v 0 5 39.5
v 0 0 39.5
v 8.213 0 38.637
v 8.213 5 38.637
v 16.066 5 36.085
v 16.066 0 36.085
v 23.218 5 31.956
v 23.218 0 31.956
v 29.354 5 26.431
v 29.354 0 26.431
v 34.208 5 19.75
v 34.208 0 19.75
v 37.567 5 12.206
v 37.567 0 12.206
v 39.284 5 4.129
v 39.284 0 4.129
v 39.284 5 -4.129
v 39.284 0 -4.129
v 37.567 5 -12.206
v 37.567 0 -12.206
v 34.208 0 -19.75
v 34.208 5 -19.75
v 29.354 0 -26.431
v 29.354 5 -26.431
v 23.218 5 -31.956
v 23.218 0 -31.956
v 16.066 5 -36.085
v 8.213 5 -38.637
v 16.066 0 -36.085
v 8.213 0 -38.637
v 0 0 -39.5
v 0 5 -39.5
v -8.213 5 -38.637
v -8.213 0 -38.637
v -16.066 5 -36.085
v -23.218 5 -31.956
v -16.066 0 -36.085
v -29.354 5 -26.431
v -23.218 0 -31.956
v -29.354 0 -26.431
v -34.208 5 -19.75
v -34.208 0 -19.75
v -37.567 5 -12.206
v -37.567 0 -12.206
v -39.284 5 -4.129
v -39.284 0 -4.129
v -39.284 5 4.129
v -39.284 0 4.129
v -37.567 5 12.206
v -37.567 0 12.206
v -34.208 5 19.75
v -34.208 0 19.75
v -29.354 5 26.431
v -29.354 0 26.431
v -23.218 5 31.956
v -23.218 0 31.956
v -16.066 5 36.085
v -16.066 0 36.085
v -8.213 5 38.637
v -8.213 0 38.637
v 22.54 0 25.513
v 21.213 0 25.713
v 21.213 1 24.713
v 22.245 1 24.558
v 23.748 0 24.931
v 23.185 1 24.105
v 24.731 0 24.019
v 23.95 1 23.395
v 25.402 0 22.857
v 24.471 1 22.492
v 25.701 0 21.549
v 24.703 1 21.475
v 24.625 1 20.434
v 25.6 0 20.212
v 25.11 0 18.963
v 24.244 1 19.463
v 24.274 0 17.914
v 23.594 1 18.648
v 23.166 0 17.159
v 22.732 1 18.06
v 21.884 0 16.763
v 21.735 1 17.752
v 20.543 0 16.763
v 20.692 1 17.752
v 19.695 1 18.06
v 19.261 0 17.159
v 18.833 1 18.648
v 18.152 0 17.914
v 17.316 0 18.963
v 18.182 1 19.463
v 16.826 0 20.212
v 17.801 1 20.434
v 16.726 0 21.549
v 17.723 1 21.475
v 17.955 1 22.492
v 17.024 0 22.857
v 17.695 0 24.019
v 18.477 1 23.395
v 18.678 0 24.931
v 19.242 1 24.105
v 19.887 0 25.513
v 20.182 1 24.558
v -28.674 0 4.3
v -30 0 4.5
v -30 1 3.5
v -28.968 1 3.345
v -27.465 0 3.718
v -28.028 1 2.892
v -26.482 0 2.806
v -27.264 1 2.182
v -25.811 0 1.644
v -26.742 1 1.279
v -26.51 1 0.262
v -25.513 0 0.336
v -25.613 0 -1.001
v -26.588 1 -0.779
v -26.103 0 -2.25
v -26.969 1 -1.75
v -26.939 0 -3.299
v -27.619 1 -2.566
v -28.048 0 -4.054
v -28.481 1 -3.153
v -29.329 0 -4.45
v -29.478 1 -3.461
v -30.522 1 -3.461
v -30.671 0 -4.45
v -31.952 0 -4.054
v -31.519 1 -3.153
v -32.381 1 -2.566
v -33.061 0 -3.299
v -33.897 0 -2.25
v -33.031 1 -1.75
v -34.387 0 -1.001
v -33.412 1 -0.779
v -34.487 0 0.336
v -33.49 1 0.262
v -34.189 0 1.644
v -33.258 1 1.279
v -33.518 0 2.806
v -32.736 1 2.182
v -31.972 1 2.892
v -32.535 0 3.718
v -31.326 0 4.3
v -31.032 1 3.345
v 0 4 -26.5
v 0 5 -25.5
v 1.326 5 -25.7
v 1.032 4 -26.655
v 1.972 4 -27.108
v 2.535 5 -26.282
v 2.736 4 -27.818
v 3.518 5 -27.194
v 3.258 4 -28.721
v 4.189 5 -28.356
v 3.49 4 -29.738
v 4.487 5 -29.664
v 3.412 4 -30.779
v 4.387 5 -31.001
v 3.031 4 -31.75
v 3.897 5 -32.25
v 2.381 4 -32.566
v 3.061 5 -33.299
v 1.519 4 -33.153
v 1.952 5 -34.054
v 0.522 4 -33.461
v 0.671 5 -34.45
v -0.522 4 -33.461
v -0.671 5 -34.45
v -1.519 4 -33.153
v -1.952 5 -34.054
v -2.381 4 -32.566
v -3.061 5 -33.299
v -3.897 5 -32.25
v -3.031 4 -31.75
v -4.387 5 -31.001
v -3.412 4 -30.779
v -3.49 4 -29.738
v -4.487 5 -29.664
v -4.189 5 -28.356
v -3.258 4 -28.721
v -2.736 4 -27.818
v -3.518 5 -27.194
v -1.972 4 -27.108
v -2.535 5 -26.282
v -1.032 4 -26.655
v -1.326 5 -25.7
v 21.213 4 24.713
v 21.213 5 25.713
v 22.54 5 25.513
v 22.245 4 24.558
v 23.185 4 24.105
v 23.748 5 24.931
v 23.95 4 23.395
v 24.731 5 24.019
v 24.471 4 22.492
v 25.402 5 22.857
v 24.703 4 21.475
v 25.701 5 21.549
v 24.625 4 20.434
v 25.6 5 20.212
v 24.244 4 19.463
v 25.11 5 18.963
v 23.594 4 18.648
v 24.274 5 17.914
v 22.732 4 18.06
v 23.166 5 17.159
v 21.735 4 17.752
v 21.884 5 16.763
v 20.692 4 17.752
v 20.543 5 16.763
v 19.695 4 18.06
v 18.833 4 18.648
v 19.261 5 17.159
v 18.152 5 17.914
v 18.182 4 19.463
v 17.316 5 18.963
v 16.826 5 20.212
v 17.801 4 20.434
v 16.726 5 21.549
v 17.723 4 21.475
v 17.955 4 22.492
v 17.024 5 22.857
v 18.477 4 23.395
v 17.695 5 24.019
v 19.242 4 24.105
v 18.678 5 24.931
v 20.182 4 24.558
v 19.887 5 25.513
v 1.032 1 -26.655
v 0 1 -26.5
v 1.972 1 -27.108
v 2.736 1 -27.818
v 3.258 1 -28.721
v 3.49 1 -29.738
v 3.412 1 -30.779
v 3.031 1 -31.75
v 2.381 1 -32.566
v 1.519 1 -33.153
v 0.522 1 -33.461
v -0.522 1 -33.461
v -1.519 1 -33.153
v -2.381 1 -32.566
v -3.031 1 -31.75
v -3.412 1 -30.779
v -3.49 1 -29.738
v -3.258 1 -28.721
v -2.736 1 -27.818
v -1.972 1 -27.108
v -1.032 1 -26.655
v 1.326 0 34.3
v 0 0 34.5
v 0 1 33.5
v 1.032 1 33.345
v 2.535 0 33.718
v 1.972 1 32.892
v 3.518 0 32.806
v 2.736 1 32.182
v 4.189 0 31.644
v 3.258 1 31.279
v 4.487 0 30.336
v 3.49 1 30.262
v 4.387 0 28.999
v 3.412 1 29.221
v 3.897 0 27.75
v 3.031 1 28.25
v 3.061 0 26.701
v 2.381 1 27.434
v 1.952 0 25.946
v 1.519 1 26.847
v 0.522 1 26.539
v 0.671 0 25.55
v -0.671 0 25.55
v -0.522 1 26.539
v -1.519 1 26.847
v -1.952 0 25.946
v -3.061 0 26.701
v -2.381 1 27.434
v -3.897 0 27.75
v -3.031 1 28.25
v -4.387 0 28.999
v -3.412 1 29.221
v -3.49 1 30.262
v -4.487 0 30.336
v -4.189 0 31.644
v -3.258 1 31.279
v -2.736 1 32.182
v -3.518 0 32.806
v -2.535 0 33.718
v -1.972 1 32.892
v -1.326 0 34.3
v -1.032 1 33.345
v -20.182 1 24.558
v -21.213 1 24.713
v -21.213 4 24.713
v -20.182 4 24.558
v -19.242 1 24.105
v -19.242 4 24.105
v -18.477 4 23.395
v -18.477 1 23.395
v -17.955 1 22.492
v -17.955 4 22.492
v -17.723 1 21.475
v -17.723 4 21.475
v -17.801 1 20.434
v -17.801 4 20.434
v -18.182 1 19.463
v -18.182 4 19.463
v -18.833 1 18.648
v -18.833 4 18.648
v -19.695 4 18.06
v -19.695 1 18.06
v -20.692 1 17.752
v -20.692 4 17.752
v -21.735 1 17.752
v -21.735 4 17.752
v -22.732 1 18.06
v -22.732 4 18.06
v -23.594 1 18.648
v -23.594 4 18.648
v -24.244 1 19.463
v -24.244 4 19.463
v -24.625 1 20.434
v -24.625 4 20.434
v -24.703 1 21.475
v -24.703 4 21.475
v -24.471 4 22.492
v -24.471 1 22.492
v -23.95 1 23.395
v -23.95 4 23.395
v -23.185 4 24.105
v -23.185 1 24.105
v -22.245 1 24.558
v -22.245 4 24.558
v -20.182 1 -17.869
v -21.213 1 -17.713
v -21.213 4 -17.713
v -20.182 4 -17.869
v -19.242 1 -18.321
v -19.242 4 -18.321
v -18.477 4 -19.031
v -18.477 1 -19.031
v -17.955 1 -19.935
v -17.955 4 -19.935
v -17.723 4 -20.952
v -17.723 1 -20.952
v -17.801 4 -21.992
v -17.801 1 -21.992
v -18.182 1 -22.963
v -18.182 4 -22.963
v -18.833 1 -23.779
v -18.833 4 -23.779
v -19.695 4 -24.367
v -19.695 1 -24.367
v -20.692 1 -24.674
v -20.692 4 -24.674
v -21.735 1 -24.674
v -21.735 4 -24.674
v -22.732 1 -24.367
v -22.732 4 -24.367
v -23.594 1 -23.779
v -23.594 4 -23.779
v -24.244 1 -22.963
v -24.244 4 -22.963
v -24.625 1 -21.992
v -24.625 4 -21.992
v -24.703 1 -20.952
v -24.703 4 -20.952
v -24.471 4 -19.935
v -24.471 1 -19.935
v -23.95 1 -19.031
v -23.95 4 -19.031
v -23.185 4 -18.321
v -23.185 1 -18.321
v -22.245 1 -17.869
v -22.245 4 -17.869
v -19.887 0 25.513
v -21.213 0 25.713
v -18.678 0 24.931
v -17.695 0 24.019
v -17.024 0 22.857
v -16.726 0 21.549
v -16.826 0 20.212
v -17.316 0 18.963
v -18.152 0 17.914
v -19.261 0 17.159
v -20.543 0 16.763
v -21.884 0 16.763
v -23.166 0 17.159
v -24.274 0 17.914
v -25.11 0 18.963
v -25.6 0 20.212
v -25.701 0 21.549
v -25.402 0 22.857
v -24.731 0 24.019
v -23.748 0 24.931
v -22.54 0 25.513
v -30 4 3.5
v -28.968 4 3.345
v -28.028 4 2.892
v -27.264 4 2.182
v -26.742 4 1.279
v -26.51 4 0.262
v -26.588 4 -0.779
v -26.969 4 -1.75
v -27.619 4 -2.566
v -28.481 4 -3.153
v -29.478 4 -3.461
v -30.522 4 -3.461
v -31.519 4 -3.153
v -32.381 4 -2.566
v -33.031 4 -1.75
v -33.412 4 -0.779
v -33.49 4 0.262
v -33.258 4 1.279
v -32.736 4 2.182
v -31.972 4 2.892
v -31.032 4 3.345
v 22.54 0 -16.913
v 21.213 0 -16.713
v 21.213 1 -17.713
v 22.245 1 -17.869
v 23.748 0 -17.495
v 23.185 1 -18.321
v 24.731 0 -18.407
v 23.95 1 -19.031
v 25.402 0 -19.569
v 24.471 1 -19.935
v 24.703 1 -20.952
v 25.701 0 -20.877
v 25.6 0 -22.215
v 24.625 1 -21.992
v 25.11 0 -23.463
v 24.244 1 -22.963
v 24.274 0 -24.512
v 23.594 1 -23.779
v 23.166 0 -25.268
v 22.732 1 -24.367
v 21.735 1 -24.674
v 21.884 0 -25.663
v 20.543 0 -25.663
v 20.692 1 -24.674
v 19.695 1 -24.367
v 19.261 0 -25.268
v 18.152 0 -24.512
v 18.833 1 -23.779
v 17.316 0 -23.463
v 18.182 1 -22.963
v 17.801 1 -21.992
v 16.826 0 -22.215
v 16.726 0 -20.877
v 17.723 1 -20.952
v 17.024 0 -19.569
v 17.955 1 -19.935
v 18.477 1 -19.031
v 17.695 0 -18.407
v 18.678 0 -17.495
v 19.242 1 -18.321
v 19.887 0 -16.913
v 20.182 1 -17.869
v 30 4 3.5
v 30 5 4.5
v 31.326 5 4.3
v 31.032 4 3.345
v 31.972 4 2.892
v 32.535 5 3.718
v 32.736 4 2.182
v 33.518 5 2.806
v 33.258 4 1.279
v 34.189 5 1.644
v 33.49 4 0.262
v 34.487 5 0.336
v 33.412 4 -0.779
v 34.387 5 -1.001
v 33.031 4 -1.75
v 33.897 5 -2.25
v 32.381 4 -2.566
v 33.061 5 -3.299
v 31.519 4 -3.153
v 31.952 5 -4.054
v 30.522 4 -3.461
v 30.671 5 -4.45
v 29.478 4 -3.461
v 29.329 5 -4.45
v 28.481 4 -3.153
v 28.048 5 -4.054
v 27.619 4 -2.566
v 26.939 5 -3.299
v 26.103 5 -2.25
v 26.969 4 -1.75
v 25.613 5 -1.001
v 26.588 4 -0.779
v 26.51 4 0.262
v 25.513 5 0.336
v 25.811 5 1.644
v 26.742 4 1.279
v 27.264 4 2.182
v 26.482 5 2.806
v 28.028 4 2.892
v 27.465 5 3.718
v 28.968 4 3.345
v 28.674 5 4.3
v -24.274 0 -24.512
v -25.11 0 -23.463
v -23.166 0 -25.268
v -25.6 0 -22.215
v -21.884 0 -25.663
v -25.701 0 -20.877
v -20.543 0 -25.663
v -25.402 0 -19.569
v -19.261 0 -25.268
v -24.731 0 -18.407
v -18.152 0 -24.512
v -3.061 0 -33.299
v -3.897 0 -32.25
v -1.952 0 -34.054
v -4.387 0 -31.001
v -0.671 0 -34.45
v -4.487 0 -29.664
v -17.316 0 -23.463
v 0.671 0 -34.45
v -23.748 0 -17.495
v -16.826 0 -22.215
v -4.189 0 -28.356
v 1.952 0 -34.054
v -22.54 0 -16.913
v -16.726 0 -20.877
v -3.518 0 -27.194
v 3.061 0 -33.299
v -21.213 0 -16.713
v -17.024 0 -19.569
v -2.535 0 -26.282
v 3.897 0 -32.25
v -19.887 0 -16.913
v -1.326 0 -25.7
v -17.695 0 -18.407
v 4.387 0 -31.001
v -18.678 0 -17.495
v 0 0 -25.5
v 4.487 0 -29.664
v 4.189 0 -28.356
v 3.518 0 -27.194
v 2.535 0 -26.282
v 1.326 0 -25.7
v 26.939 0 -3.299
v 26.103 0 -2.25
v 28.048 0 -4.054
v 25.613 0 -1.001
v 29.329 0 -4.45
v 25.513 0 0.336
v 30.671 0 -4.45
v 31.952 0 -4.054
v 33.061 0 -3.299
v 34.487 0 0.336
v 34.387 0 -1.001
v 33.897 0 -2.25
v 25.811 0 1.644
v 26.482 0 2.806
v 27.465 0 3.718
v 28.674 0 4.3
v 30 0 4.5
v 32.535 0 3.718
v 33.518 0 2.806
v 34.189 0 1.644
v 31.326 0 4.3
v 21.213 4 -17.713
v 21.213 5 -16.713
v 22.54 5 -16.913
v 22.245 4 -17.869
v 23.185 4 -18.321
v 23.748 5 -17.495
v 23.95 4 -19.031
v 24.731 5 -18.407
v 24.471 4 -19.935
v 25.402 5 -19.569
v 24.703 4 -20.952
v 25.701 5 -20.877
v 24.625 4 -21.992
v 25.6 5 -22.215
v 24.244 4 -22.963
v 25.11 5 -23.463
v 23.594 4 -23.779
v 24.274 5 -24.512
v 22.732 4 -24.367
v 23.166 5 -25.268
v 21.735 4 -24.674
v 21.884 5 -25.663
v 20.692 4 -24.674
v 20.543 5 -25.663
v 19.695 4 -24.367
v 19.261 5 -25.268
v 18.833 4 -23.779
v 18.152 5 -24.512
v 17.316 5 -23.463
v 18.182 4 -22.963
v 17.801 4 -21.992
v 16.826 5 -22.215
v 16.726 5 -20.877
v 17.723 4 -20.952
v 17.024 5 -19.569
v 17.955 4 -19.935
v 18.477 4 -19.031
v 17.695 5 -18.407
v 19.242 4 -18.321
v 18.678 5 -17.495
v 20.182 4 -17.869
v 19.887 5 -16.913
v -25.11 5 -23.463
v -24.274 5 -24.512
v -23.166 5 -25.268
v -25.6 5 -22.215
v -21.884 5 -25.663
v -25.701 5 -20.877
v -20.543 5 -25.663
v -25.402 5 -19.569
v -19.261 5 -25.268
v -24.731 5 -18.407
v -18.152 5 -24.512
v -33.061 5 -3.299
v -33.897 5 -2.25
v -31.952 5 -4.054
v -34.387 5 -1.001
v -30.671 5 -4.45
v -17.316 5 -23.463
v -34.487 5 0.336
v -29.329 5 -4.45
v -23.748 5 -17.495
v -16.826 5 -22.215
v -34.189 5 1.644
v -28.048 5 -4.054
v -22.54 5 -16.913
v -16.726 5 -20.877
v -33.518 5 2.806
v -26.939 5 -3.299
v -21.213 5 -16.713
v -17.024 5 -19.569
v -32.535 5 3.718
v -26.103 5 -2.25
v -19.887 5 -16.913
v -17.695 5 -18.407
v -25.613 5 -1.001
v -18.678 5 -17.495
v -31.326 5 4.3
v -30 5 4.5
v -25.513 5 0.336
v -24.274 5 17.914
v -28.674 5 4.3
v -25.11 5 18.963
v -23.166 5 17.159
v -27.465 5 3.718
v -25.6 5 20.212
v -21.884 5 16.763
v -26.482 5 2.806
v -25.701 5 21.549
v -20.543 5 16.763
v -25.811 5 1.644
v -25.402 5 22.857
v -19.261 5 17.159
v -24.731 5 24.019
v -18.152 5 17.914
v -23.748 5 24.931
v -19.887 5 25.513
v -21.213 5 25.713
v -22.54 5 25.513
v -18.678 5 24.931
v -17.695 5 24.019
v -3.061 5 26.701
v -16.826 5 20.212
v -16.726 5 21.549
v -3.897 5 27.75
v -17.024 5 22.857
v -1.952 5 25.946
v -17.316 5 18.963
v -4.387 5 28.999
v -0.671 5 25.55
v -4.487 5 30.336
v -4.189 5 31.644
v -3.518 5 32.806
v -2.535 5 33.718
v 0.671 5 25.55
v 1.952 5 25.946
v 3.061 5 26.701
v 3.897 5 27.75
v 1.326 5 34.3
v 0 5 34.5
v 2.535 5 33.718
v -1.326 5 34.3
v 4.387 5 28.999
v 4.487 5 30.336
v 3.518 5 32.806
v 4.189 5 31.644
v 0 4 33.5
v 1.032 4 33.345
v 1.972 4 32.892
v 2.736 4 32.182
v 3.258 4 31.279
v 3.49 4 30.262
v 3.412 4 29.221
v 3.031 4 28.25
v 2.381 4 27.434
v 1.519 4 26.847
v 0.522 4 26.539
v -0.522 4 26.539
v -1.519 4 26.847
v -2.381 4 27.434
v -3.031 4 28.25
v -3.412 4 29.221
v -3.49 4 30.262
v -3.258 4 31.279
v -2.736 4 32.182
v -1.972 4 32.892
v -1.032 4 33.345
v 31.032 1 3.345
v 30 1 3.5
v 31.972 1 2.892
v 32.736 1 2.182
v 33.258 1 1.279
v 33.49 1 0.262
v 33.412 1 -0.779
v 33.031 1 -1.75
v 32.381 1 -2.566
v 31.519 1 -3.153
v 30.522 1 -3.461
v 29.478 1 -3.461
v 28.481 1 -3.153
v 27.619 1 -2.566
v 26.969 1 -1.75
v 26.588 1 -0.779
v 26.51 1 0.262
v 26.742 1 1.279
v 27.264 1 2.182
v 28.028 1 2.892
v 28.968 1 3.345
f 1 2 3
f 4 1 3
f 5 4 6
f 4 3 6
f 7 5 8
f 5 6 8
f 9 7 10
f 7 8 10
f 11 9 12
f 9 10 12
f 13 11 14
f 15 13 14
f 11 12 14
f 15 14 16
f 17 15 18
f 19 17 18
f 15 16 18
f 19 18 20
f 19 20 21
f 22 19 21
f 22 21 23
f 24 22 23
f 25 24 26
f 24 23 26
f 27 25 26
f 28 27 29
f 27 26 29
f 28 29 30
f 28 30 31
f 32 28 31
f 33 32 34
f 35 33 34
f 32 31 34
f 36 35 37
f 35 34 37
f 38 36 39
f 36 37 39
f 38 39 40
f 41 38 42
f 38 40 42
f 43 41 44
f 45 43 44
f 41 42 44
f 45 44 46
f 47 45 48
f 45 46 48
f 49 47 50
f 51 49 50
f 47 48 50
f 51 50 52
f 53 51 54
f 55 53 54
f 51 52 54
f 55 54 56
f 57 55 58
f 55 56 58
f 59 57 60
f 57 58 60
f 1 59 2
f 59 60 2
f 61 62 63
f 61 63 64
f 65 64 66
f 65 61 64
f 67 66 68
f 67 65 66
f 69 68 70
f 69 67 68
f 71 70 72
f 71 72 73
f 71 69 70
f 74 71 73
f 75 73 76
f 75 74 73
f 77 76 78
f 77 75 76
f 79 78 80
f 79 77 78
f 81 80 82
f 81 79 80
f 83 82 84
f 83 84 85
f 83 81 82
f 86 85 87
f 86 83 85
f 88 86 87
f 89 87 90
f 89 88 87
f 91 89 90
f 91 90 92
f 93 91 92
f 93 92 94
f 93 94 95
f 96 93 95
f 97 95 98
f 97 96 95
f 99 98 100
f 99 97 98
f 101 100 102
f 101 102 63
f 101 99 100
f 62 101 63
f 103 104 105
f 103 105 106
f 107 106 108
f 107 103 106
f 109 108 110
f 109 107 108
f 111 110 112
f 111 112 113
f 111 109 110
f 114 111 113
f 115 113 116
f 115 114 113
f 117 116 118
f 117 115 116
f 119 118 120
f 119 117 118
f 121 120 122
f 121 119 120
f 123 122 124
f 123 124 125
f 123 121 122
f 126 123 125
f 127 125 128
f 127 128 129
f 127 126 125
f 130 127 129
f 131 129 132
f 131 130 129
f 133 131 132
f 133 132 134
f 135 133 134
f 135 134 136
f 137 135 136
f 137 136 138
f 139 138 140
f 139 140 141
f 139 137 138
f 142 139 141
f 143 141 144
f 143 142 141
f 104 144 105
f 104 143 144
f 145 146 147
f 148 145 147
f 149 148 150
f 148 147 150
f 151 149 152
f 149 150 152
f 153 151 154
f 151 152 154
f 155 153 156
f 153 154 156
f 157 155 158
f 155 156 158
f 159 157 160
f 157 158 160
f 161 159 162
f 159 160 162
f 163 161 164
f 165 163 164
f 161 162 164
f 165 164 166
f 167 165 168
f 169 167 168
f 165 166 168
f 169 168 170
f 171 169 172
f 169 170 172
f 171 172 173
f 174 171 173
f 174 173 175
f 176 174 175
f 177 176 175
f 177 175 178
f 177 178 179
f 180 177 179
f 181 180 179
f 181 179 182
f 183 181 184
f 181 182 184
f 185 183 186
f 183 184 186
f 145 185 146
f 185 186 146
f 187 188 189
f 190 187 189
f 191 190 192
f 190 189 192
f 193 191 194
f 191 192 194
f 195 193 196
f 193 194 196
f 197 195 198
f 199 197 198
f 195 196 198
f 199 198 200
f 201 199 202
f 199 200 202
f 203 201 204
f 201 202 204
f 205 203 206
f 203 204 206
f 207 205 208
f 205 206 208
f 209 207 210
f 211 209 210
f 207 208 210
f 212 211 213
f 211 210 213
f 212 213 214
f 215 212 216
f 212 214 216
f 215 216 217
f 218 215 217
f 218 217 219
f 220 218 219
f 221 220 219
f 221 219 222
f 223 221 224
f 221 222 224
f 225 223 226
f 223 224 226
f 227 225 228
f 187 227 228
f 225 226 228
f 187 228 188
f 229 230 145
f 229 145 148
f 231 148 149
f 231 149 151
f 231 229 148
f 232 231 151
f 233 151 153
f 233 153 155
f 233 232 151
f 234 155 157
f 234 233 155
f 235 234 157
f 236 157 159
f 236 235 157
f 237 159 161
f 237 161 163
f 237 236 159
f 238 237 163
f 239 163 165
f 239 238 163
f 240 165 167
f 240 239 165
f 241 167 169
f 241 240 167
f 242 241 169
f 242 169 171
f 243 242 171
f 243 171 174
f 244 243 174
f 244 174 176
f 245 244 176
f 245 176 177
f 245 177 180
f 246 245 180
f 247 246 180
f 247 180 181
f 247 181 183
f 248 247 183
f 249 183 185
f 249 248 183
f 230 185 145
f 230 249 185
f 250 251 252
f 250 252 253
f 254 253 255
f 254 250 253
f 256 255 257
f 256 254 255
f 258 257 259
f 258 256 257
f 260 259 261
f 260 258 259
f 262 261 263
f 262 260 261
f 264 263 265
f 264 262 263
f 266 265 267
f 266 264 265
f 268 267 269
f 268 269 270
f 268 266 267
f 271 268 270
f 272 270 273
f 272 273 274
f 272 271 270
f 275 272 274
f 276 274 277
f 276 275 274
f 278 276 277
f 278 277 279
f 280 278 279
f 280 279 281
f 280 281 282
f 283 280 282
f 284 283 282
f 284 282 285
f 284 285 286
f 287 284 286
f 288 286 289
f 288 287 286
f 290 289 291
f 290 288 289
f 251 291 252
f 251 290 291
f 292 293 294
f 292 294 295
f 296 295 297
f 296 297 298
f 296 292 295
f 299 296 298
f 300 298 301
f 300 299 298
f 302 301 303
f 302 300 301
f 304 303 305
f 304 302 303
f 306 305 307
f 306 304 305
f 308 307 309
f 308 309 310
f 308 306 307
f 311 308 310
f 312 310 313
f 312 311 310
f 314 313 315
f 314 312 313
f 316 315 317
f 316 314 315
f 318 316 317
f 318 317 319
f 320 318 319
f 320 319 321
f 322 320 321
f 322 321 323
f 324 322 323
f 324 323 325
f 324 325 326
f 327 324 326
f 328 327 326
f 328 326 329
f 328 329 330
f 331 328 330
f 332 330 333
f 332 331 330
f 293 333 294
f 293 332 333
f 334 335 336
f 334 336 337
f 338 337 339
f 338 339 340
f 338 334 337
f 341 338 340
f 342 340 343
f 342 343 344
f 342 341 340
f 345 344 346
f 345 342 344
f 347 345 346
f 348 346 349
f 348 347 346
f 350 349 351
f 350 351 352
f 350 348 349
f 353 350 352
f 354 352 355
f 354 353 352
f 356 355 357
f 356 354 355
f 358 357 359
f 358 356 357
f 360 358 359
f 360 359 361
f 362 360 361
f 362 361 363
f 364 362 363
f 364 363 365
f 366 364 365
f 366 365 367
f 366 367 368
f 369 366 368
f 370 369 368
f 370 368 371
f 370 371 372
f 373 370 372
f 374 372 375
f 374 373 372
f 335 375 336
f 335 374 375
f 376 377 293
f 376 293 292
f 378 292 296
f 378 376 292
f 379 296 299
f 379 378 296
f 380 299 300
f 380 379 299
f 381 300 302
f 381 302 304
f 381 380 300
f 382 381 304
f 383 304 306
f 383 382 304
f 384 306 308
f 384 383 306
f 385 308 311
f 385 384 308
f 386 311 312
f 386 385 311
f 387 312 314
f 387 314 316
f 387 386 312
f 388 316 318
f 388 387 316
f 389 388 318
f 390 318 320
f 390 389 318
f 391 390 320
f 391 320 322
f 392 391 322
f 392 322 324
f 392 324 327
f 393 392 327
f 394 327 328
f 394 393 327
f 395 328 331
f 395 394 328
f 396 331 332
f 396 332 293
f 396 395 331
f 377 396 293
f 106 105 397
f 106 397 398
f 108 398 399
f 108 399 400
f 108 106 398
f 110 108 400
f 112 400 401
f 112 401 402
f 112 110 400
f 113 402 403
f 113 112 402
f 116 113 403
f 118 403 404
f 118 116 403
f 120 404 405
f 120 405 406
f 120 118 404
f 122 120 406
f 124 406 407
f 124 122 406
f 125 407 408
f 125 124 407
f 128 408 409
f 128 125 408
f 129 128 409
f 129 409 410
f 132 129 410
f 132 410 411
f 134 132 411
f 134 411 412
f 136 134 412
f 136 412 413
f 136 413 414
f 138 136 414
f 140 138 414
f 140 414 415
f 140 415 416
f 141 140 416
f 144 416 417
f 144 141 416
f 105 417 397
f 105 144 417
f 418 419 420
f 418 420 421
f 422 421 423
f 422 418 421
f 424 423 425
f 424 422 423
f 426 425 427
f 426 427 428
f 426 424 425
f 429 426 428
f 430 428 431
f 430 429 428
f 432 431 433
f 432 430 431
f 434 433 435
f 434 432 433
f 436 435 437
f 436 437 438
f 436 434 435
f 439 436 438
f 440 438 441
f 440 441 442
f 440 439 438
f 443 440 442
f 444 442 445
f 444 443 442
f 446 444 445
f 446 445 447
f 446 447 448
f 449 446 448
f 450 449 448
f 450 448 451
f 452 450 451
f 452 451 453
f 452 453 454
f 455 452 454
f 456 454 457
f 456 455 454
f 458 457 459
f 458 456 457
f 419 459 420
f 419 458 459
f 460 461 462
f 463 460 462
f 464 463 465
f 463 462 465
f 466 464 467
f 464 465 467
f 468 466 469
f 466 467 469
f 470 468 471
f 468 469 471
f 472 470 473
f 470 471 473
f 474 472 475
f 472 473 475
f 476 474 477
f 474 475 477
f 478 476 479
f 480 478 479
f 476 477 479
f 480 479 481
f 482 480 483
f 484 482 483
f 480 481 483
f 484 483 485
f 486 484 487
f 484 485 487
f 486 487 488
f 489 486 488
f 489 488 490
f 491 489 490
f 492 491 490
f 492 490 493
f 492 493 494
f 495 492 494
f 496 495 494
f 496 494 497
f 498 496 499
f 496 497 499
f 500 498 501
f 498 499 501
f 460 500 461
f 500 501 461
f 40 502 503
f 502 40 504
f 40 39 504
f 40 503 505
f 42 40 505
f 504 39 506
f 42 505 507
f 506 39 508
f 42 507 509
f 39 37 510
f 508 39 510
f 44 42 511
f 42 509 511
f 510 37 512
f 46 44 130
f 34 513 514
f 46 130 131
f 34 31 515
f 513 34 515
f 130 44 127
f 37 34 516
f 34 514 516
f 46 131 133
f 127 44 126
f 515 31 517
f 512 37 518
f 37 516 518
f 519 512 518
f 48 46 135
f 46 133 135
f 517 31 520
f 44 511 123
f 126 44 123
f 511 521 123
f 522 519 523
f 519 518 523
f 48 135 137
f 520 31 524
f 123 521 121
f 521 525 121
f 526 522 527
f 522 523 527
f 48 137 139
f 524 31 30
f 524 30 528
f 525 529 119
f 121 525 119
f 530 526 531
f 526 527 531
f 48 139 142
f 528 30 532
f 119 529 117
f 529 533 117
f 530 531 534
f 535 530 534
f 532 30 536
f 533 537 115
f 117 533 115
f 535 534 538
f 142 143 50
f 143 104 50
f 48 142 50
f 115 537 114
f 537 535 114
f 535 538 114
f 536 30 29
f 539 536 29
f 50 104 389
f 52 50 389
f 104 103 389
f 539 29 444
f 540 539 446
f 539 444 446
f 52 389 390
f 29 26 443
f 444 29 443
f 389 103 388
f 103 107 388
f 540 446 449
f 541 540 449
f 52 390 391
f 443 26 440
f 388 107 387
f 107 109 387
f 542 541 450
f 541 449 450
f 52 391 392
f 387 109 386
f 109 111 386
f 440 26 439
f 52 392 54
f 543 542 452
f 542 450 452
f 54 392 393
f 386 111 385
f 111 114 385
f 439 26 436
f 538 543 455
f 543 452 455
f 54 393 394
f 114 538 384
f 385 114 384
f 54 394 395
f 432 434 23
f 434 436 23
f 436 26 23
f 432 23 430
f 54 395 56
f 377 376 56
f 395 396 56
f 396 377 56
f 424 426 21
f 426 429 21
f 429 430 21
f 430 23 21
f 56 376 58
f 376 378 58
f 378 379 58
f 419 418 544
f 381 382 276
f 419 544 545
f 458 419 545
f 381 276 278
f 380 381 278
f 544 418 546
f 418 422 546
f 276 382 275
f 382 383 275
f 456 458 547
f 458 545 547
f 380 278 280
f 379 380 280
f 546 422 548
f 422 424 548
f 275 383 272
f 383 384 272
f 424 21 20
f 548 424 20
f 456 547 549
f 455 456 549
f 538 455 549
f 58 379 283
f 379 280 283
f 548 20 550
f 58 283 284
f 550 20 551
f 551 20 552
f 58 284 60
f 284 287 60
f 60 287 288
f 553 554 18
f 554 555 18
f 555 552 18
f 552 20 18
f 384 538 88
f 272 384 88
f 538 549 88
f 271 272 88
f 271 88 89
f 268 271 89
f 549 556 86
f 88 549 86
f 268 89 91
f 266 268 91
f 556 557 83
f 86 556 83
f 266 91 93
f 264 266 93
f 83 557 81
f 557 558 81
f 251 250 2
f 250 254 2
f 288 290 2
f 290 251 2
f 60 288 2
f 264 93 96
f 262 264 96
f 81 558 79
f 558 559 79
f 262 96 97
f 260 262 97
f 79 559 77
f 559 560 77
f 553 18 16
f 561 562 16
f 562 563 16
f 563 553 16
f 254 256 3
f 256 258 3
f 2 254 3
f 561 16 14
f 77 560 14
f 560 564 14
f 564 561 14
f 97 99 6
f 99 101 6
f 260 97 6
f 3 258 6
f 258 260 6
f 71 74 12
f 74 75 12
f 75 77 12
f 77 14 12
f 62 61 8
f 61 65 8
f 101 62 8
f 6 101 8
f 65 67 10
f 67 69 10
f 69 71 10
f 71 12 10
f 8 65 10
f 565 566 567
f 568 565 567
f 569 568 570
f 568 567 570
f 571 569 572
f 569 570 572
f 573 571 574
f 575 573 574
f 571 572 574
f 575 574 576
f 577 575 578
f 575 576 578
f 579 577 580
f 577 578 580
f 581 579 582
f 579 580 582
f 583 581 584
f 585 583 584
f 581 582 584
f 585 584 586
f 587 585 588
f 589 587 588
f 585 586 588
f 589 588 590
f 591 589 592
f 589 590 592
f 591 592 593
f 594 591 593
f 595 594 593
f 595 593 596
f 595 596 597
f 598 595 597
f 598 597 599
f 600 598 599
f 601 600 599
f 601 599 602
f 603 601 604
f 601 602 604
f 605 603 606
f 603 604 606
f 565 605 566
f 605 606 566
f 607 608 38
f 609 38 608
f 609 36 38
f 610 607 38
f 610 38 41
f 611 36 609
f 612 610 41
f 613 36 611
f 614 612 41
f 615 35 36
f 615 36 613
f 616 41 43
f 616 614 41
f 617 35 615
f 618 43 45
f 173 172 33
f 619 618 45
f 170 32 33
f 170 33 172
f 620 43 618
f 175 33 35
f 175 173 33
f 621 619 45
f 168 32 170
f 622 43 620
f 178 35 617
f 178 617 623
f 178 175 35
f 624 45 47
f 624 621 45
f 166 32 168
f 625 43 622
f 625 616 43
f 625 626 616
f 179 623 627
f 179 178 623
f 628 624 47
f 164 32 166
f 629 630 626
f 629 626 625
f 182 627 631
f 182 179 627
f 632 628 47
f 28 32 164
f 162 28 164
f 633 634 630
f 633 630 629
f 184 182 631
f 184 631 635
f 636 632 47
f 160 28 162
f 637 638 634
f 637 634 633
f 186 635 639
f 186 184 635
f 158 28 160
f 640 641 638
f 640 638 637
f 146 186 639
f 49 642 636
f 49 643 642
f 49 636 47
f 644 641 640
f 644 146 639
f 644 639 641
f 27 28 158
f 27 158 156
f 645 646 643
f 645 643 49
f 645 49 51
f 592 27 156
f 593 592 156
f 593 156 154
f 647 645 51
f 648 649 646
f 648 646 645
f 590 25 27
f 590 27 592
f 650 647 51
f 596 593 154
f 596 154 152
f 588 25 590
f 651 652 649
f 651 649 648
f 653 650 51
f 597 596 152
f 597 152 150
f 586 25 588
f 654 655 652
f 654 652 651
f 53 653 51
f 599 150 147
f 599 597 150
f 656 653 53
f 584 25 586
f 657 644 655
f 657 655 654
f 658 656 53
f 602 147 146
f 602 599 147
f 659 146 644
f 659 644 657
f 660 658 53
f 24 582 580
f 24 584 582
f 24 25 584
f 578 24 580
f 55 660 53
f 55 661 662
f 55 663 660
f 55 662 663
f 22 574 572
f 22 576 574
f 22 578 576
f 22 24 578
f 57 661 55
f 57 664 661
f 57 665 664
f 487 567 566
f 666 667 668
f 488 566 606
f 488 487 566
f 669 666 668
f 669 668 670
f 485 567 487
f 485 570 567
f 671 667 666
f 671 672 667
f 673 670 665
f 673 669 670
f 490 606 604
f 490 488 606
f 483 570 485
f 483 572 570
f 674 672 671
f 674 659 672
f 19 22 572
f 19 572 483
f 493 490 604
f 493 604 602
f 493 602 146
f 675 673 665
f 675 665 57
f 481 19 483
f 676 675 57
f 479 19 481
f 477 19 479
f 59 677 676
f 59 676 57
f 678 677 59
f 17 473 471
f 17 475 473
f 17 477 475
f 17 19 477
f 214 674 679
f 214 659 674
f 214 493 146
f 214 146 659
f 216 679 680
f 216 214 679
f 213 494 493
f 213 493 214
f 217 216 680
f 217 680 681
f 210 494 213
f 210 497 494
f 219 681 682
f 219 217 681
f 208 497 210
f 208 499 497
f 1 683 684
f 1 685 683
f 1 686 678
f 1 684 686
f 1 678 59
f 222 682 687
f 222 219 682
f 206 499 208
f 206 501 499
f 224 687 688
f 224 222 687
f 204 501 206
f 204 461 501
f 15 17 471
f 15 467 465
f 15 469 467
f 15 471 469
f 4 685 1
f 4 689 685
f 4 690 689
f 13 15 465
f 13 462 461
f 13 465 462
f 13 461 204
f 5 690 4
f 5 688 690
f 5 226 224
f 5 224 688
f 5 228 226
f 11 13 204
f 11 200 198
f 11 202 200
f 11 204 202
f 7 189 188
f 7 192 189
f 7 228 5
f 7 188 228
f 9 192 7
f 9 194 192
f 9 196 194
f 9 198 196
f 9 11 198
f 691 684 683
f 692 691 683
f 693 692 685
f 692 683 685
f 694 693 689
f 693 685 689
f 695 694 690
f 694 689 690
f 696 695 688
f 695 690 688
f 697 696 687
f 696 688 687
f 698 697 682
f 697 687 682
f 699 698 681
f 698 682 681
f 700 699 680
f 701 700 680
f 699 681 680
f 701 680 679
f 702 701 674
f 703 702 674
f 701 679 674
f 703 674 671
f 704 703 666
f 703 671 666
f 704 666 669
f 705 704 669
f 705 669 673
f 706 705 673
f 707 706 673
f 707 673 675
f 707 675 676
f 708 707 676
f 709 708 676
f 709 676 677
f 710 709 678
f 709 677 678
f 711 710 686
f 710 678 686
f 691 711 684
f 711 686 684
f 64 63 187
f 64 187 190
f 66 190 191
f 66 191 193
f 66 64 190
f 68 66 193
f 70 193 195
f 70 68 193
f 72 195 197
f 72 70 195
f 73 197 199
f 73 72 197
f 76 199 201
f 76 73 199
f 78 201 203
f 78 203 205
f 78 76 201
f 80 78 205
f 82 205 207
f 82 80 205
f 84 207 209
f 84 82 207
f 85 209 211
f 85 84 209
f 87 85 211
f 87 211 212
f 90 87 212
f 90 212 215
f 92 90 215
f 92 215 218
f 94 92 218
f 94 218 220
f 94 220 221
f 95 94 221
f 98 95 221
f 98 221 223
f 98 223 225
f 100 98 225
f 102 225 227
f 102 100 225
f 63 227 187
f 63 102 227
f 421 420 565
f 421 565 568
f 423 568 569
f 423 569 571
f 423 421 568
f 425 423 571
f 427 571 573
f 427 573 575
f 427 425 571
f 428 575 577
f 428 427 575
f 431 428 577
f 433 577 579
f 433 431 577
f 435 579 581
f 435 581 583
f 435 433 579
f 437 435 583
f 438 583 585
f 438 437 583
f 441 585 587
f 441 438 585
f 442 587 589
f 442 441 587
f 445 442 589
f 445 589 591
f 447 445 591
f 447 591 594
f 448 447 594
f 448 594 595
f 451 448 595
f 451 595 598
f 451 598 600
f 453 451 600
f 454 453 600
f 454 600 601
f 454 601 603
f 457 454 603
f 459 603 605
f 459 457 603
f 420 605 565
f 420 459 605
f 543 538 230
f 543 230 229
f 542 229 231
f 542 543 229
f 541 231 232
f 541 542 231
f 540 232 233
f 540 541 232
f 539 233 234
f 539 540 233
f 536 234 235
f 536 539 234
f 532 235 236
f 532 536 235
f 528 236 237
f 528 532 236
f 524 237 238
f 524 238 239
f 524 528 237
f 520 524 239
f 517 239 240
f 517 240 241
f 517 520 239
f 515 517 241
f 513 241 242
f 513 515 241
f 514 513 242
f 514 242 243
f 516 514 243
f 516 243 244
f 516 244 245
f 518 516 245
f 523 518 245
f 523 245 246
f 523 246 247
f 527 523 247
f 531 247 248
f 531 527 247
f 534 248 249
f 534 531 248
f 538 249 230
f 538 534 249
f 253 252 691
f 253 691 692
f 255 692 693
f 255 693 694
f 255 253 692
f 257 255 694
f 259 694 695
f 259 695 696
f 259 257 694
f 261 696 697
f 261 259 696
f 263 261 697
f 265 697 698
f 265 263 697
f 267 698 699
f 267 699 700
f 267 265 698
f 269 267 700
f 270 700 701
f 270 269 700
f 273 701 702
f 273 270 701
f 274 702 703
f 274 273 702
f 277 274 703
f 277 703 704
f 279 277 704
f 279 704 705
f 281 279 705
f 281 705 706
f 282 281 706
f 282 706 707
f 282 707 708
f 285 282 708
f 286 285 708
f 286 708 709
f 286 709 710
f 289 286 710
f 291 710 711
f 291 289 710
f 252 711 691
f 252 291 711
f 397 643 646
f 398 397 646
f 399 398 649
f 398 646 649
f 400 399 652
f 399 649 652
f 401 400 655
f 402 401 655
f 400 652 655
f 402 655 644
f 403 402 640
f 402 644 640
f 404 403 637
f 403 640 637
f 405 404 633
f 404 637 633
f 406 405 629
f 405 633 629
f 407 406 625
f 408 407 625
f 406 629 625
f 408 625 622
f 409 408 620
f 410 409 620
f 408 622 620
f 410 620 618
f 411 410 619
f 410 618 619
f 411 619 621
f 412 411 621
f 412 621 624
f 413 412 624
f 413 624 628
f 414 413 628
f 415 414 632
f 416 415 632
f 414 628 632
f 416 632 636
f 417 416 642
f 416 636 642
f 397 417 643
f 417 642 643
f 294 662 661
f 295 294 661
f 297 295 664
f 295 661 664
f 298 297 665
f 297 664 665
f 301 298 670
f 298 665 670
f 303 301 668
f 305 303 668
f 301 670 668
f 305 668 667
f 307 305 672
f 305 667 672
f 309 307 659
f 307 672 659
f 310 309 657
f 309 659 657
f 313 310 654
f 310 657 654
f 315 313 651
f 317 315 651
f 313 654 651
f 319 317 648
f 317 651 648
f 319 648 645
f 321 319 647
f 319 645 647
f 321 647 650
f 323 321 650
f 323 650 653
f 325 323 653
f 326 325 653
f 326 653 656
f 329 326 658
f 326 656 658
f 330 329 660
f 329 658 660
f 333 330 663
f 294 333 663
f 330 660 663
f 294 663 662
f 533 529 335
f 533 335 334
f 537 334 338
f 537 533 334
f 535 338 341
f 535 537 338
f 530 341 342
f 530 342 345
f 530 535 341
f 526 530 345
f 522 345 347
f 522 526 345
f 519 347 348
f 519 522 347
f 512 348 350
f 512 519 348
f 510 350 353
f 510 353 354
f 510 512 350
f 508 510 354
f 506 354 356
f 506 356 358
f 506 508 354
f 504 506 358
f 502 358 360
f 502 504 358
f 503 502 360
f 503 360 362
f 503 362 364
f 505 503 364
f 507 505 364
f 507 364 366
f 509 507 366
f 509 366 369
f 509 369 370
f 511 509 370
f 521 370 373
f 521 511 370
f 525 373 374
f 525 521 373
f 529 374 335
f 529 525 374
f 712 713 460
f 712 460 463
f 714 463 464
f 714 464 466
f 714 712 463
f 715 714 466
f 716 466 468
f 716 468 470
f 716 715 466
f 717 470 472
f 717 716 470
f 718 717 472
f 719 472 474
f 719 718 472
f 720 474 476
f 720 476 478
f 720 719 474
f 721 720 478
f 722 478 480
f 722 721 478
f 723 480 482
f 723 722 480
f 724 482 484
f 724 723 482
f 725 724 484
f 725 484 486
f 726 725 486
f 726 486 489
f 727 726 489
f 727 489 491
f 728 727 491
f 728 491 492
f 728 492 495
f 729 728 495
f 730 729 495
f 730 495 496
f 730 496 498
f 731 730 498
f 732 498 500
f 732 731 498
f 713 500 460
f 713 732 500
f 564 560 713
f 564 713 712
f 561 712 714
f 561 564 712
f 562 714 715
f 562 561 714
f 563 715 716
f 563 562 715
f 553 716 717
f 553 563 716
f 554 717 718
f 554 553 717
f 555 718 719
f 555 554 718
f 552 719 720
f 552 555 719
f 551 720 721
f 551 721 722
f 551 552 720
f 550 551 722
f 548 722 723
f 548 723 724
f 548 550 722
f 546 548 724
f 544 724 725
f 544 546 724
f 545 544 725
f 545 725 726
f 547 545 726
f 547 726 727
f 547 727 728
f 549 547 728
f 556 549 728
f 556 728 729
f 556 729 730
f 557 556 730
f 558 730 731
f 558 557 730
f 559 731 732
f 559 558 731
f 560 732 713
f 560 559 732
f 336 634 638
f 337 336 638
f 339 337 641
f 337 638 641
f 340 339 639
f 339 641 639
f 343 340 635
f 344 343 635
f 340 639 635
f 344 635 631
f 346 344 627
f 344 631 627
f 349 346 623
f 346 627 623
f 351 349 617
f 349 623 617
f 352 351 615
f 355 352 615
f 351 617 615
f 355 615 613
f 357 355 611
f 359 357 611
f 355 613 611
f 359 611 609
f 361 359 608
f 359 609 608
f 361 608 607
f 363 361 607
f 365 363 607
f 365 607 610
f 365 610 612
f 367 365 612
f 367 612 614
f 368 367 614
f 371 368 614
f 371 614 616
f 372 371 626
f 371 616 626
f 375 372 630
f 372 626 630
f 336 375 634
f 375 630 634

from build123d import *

# Parameters (mm, degrees)
ESBO_O1_R                = 39.5
ESBO_O1_R_2              = 3.5
RESSALTO_EXTRUS_O1_DEPTH = 5
CHANFRO1_SIZE            = 1


with BuildPart() as part:
    # Esboço1 → Ressalto-extrusão1 (new body)
    with BuildSketch(Plane(origin=(0, 0, 0), x_dir=(1, 0, 0), z_dir=(0, 1, 0))):
        with Locations(Location((0, 0, 0), (0, 0, 270))):
            Circle(ESBO_O1_R)
        with Locations(Location((-21.213203436, 21.213203436, 0), (0, 0, 270))):
            Circle(ESBO_O1_R_2, mode=Mode.SUBTRACT)
        with Locations(Location((-21.213203436, -21.213203436, 0), (0, 0, 270))):
            Circle(ESBO_O1_R_2, mode=Mode.SUBTRACT)
        with Locations(Location((21.213203436, -21.213203436, 0), (0, 0, 270))):
            Circle(ESBO_O1_R_2, mode=Mode.SUBTRACT)
        with Locations(Location((21.213203436, 21.213203436, 0), (0, 0, 270))):
            Circle(ESBO_O1_R_2, mode=Mode.SUBTRACT)
        with Locations(Location((-30, 0, 0), (0, 0, 270))):
            Circle(ESBO_O1_R_2, mode=Mode.SUBTRACT)
        with Locations(Location((0, -30, 0), (0, 0, 270))):
            Circle(ESBO_O1_R_2, mode=Mode.SUBTRACT)
        with Locations(Location((30, 0, 0), (0, 0, 270))):
            Circle(ESBO_O1_R_2, mode=Mode.SUBTRACT)
        with Locations(Location((0, 30, 0), (0, 0, 270))):
            Circle(ESBO_O1_R_2, mode=Mode.SUBTRACT)
    extrude(amount=RESSALTO_EXTRUS_O1_DEPTH)

    # Chanfro1
    chanfro1_edges = [part.edges().sort_by_distance(p)[0] for p in [
        (0, 0, -33.5),
        (30, 0, -3.5),
        (-21.213203436, 5, -24.713203436),
        (0, 0, 26.5),
        (-30, 0, -3.5),
        (21.213203436, 0, -24.713203436),
        (21.213203436, 0, 17.713203436),
        (-21.213203436, 0, 17.713203436),
        (-21.213203436, 0, -24.713203436),
        (-21.213203436, 5, 17.713203436),
        (21.213203436, 5, 17.713203436),
        (21.213203436, 5, -24.713203436),
        (-30, 5, -3.5),
        (0, 5, 26.5),
        (30, 5, -3.5),
        (0, 5, -33.5),
    ]]
    chamfer(chanfro1_edges, length=CHANFRO1_SIZE)


solid = part.part
